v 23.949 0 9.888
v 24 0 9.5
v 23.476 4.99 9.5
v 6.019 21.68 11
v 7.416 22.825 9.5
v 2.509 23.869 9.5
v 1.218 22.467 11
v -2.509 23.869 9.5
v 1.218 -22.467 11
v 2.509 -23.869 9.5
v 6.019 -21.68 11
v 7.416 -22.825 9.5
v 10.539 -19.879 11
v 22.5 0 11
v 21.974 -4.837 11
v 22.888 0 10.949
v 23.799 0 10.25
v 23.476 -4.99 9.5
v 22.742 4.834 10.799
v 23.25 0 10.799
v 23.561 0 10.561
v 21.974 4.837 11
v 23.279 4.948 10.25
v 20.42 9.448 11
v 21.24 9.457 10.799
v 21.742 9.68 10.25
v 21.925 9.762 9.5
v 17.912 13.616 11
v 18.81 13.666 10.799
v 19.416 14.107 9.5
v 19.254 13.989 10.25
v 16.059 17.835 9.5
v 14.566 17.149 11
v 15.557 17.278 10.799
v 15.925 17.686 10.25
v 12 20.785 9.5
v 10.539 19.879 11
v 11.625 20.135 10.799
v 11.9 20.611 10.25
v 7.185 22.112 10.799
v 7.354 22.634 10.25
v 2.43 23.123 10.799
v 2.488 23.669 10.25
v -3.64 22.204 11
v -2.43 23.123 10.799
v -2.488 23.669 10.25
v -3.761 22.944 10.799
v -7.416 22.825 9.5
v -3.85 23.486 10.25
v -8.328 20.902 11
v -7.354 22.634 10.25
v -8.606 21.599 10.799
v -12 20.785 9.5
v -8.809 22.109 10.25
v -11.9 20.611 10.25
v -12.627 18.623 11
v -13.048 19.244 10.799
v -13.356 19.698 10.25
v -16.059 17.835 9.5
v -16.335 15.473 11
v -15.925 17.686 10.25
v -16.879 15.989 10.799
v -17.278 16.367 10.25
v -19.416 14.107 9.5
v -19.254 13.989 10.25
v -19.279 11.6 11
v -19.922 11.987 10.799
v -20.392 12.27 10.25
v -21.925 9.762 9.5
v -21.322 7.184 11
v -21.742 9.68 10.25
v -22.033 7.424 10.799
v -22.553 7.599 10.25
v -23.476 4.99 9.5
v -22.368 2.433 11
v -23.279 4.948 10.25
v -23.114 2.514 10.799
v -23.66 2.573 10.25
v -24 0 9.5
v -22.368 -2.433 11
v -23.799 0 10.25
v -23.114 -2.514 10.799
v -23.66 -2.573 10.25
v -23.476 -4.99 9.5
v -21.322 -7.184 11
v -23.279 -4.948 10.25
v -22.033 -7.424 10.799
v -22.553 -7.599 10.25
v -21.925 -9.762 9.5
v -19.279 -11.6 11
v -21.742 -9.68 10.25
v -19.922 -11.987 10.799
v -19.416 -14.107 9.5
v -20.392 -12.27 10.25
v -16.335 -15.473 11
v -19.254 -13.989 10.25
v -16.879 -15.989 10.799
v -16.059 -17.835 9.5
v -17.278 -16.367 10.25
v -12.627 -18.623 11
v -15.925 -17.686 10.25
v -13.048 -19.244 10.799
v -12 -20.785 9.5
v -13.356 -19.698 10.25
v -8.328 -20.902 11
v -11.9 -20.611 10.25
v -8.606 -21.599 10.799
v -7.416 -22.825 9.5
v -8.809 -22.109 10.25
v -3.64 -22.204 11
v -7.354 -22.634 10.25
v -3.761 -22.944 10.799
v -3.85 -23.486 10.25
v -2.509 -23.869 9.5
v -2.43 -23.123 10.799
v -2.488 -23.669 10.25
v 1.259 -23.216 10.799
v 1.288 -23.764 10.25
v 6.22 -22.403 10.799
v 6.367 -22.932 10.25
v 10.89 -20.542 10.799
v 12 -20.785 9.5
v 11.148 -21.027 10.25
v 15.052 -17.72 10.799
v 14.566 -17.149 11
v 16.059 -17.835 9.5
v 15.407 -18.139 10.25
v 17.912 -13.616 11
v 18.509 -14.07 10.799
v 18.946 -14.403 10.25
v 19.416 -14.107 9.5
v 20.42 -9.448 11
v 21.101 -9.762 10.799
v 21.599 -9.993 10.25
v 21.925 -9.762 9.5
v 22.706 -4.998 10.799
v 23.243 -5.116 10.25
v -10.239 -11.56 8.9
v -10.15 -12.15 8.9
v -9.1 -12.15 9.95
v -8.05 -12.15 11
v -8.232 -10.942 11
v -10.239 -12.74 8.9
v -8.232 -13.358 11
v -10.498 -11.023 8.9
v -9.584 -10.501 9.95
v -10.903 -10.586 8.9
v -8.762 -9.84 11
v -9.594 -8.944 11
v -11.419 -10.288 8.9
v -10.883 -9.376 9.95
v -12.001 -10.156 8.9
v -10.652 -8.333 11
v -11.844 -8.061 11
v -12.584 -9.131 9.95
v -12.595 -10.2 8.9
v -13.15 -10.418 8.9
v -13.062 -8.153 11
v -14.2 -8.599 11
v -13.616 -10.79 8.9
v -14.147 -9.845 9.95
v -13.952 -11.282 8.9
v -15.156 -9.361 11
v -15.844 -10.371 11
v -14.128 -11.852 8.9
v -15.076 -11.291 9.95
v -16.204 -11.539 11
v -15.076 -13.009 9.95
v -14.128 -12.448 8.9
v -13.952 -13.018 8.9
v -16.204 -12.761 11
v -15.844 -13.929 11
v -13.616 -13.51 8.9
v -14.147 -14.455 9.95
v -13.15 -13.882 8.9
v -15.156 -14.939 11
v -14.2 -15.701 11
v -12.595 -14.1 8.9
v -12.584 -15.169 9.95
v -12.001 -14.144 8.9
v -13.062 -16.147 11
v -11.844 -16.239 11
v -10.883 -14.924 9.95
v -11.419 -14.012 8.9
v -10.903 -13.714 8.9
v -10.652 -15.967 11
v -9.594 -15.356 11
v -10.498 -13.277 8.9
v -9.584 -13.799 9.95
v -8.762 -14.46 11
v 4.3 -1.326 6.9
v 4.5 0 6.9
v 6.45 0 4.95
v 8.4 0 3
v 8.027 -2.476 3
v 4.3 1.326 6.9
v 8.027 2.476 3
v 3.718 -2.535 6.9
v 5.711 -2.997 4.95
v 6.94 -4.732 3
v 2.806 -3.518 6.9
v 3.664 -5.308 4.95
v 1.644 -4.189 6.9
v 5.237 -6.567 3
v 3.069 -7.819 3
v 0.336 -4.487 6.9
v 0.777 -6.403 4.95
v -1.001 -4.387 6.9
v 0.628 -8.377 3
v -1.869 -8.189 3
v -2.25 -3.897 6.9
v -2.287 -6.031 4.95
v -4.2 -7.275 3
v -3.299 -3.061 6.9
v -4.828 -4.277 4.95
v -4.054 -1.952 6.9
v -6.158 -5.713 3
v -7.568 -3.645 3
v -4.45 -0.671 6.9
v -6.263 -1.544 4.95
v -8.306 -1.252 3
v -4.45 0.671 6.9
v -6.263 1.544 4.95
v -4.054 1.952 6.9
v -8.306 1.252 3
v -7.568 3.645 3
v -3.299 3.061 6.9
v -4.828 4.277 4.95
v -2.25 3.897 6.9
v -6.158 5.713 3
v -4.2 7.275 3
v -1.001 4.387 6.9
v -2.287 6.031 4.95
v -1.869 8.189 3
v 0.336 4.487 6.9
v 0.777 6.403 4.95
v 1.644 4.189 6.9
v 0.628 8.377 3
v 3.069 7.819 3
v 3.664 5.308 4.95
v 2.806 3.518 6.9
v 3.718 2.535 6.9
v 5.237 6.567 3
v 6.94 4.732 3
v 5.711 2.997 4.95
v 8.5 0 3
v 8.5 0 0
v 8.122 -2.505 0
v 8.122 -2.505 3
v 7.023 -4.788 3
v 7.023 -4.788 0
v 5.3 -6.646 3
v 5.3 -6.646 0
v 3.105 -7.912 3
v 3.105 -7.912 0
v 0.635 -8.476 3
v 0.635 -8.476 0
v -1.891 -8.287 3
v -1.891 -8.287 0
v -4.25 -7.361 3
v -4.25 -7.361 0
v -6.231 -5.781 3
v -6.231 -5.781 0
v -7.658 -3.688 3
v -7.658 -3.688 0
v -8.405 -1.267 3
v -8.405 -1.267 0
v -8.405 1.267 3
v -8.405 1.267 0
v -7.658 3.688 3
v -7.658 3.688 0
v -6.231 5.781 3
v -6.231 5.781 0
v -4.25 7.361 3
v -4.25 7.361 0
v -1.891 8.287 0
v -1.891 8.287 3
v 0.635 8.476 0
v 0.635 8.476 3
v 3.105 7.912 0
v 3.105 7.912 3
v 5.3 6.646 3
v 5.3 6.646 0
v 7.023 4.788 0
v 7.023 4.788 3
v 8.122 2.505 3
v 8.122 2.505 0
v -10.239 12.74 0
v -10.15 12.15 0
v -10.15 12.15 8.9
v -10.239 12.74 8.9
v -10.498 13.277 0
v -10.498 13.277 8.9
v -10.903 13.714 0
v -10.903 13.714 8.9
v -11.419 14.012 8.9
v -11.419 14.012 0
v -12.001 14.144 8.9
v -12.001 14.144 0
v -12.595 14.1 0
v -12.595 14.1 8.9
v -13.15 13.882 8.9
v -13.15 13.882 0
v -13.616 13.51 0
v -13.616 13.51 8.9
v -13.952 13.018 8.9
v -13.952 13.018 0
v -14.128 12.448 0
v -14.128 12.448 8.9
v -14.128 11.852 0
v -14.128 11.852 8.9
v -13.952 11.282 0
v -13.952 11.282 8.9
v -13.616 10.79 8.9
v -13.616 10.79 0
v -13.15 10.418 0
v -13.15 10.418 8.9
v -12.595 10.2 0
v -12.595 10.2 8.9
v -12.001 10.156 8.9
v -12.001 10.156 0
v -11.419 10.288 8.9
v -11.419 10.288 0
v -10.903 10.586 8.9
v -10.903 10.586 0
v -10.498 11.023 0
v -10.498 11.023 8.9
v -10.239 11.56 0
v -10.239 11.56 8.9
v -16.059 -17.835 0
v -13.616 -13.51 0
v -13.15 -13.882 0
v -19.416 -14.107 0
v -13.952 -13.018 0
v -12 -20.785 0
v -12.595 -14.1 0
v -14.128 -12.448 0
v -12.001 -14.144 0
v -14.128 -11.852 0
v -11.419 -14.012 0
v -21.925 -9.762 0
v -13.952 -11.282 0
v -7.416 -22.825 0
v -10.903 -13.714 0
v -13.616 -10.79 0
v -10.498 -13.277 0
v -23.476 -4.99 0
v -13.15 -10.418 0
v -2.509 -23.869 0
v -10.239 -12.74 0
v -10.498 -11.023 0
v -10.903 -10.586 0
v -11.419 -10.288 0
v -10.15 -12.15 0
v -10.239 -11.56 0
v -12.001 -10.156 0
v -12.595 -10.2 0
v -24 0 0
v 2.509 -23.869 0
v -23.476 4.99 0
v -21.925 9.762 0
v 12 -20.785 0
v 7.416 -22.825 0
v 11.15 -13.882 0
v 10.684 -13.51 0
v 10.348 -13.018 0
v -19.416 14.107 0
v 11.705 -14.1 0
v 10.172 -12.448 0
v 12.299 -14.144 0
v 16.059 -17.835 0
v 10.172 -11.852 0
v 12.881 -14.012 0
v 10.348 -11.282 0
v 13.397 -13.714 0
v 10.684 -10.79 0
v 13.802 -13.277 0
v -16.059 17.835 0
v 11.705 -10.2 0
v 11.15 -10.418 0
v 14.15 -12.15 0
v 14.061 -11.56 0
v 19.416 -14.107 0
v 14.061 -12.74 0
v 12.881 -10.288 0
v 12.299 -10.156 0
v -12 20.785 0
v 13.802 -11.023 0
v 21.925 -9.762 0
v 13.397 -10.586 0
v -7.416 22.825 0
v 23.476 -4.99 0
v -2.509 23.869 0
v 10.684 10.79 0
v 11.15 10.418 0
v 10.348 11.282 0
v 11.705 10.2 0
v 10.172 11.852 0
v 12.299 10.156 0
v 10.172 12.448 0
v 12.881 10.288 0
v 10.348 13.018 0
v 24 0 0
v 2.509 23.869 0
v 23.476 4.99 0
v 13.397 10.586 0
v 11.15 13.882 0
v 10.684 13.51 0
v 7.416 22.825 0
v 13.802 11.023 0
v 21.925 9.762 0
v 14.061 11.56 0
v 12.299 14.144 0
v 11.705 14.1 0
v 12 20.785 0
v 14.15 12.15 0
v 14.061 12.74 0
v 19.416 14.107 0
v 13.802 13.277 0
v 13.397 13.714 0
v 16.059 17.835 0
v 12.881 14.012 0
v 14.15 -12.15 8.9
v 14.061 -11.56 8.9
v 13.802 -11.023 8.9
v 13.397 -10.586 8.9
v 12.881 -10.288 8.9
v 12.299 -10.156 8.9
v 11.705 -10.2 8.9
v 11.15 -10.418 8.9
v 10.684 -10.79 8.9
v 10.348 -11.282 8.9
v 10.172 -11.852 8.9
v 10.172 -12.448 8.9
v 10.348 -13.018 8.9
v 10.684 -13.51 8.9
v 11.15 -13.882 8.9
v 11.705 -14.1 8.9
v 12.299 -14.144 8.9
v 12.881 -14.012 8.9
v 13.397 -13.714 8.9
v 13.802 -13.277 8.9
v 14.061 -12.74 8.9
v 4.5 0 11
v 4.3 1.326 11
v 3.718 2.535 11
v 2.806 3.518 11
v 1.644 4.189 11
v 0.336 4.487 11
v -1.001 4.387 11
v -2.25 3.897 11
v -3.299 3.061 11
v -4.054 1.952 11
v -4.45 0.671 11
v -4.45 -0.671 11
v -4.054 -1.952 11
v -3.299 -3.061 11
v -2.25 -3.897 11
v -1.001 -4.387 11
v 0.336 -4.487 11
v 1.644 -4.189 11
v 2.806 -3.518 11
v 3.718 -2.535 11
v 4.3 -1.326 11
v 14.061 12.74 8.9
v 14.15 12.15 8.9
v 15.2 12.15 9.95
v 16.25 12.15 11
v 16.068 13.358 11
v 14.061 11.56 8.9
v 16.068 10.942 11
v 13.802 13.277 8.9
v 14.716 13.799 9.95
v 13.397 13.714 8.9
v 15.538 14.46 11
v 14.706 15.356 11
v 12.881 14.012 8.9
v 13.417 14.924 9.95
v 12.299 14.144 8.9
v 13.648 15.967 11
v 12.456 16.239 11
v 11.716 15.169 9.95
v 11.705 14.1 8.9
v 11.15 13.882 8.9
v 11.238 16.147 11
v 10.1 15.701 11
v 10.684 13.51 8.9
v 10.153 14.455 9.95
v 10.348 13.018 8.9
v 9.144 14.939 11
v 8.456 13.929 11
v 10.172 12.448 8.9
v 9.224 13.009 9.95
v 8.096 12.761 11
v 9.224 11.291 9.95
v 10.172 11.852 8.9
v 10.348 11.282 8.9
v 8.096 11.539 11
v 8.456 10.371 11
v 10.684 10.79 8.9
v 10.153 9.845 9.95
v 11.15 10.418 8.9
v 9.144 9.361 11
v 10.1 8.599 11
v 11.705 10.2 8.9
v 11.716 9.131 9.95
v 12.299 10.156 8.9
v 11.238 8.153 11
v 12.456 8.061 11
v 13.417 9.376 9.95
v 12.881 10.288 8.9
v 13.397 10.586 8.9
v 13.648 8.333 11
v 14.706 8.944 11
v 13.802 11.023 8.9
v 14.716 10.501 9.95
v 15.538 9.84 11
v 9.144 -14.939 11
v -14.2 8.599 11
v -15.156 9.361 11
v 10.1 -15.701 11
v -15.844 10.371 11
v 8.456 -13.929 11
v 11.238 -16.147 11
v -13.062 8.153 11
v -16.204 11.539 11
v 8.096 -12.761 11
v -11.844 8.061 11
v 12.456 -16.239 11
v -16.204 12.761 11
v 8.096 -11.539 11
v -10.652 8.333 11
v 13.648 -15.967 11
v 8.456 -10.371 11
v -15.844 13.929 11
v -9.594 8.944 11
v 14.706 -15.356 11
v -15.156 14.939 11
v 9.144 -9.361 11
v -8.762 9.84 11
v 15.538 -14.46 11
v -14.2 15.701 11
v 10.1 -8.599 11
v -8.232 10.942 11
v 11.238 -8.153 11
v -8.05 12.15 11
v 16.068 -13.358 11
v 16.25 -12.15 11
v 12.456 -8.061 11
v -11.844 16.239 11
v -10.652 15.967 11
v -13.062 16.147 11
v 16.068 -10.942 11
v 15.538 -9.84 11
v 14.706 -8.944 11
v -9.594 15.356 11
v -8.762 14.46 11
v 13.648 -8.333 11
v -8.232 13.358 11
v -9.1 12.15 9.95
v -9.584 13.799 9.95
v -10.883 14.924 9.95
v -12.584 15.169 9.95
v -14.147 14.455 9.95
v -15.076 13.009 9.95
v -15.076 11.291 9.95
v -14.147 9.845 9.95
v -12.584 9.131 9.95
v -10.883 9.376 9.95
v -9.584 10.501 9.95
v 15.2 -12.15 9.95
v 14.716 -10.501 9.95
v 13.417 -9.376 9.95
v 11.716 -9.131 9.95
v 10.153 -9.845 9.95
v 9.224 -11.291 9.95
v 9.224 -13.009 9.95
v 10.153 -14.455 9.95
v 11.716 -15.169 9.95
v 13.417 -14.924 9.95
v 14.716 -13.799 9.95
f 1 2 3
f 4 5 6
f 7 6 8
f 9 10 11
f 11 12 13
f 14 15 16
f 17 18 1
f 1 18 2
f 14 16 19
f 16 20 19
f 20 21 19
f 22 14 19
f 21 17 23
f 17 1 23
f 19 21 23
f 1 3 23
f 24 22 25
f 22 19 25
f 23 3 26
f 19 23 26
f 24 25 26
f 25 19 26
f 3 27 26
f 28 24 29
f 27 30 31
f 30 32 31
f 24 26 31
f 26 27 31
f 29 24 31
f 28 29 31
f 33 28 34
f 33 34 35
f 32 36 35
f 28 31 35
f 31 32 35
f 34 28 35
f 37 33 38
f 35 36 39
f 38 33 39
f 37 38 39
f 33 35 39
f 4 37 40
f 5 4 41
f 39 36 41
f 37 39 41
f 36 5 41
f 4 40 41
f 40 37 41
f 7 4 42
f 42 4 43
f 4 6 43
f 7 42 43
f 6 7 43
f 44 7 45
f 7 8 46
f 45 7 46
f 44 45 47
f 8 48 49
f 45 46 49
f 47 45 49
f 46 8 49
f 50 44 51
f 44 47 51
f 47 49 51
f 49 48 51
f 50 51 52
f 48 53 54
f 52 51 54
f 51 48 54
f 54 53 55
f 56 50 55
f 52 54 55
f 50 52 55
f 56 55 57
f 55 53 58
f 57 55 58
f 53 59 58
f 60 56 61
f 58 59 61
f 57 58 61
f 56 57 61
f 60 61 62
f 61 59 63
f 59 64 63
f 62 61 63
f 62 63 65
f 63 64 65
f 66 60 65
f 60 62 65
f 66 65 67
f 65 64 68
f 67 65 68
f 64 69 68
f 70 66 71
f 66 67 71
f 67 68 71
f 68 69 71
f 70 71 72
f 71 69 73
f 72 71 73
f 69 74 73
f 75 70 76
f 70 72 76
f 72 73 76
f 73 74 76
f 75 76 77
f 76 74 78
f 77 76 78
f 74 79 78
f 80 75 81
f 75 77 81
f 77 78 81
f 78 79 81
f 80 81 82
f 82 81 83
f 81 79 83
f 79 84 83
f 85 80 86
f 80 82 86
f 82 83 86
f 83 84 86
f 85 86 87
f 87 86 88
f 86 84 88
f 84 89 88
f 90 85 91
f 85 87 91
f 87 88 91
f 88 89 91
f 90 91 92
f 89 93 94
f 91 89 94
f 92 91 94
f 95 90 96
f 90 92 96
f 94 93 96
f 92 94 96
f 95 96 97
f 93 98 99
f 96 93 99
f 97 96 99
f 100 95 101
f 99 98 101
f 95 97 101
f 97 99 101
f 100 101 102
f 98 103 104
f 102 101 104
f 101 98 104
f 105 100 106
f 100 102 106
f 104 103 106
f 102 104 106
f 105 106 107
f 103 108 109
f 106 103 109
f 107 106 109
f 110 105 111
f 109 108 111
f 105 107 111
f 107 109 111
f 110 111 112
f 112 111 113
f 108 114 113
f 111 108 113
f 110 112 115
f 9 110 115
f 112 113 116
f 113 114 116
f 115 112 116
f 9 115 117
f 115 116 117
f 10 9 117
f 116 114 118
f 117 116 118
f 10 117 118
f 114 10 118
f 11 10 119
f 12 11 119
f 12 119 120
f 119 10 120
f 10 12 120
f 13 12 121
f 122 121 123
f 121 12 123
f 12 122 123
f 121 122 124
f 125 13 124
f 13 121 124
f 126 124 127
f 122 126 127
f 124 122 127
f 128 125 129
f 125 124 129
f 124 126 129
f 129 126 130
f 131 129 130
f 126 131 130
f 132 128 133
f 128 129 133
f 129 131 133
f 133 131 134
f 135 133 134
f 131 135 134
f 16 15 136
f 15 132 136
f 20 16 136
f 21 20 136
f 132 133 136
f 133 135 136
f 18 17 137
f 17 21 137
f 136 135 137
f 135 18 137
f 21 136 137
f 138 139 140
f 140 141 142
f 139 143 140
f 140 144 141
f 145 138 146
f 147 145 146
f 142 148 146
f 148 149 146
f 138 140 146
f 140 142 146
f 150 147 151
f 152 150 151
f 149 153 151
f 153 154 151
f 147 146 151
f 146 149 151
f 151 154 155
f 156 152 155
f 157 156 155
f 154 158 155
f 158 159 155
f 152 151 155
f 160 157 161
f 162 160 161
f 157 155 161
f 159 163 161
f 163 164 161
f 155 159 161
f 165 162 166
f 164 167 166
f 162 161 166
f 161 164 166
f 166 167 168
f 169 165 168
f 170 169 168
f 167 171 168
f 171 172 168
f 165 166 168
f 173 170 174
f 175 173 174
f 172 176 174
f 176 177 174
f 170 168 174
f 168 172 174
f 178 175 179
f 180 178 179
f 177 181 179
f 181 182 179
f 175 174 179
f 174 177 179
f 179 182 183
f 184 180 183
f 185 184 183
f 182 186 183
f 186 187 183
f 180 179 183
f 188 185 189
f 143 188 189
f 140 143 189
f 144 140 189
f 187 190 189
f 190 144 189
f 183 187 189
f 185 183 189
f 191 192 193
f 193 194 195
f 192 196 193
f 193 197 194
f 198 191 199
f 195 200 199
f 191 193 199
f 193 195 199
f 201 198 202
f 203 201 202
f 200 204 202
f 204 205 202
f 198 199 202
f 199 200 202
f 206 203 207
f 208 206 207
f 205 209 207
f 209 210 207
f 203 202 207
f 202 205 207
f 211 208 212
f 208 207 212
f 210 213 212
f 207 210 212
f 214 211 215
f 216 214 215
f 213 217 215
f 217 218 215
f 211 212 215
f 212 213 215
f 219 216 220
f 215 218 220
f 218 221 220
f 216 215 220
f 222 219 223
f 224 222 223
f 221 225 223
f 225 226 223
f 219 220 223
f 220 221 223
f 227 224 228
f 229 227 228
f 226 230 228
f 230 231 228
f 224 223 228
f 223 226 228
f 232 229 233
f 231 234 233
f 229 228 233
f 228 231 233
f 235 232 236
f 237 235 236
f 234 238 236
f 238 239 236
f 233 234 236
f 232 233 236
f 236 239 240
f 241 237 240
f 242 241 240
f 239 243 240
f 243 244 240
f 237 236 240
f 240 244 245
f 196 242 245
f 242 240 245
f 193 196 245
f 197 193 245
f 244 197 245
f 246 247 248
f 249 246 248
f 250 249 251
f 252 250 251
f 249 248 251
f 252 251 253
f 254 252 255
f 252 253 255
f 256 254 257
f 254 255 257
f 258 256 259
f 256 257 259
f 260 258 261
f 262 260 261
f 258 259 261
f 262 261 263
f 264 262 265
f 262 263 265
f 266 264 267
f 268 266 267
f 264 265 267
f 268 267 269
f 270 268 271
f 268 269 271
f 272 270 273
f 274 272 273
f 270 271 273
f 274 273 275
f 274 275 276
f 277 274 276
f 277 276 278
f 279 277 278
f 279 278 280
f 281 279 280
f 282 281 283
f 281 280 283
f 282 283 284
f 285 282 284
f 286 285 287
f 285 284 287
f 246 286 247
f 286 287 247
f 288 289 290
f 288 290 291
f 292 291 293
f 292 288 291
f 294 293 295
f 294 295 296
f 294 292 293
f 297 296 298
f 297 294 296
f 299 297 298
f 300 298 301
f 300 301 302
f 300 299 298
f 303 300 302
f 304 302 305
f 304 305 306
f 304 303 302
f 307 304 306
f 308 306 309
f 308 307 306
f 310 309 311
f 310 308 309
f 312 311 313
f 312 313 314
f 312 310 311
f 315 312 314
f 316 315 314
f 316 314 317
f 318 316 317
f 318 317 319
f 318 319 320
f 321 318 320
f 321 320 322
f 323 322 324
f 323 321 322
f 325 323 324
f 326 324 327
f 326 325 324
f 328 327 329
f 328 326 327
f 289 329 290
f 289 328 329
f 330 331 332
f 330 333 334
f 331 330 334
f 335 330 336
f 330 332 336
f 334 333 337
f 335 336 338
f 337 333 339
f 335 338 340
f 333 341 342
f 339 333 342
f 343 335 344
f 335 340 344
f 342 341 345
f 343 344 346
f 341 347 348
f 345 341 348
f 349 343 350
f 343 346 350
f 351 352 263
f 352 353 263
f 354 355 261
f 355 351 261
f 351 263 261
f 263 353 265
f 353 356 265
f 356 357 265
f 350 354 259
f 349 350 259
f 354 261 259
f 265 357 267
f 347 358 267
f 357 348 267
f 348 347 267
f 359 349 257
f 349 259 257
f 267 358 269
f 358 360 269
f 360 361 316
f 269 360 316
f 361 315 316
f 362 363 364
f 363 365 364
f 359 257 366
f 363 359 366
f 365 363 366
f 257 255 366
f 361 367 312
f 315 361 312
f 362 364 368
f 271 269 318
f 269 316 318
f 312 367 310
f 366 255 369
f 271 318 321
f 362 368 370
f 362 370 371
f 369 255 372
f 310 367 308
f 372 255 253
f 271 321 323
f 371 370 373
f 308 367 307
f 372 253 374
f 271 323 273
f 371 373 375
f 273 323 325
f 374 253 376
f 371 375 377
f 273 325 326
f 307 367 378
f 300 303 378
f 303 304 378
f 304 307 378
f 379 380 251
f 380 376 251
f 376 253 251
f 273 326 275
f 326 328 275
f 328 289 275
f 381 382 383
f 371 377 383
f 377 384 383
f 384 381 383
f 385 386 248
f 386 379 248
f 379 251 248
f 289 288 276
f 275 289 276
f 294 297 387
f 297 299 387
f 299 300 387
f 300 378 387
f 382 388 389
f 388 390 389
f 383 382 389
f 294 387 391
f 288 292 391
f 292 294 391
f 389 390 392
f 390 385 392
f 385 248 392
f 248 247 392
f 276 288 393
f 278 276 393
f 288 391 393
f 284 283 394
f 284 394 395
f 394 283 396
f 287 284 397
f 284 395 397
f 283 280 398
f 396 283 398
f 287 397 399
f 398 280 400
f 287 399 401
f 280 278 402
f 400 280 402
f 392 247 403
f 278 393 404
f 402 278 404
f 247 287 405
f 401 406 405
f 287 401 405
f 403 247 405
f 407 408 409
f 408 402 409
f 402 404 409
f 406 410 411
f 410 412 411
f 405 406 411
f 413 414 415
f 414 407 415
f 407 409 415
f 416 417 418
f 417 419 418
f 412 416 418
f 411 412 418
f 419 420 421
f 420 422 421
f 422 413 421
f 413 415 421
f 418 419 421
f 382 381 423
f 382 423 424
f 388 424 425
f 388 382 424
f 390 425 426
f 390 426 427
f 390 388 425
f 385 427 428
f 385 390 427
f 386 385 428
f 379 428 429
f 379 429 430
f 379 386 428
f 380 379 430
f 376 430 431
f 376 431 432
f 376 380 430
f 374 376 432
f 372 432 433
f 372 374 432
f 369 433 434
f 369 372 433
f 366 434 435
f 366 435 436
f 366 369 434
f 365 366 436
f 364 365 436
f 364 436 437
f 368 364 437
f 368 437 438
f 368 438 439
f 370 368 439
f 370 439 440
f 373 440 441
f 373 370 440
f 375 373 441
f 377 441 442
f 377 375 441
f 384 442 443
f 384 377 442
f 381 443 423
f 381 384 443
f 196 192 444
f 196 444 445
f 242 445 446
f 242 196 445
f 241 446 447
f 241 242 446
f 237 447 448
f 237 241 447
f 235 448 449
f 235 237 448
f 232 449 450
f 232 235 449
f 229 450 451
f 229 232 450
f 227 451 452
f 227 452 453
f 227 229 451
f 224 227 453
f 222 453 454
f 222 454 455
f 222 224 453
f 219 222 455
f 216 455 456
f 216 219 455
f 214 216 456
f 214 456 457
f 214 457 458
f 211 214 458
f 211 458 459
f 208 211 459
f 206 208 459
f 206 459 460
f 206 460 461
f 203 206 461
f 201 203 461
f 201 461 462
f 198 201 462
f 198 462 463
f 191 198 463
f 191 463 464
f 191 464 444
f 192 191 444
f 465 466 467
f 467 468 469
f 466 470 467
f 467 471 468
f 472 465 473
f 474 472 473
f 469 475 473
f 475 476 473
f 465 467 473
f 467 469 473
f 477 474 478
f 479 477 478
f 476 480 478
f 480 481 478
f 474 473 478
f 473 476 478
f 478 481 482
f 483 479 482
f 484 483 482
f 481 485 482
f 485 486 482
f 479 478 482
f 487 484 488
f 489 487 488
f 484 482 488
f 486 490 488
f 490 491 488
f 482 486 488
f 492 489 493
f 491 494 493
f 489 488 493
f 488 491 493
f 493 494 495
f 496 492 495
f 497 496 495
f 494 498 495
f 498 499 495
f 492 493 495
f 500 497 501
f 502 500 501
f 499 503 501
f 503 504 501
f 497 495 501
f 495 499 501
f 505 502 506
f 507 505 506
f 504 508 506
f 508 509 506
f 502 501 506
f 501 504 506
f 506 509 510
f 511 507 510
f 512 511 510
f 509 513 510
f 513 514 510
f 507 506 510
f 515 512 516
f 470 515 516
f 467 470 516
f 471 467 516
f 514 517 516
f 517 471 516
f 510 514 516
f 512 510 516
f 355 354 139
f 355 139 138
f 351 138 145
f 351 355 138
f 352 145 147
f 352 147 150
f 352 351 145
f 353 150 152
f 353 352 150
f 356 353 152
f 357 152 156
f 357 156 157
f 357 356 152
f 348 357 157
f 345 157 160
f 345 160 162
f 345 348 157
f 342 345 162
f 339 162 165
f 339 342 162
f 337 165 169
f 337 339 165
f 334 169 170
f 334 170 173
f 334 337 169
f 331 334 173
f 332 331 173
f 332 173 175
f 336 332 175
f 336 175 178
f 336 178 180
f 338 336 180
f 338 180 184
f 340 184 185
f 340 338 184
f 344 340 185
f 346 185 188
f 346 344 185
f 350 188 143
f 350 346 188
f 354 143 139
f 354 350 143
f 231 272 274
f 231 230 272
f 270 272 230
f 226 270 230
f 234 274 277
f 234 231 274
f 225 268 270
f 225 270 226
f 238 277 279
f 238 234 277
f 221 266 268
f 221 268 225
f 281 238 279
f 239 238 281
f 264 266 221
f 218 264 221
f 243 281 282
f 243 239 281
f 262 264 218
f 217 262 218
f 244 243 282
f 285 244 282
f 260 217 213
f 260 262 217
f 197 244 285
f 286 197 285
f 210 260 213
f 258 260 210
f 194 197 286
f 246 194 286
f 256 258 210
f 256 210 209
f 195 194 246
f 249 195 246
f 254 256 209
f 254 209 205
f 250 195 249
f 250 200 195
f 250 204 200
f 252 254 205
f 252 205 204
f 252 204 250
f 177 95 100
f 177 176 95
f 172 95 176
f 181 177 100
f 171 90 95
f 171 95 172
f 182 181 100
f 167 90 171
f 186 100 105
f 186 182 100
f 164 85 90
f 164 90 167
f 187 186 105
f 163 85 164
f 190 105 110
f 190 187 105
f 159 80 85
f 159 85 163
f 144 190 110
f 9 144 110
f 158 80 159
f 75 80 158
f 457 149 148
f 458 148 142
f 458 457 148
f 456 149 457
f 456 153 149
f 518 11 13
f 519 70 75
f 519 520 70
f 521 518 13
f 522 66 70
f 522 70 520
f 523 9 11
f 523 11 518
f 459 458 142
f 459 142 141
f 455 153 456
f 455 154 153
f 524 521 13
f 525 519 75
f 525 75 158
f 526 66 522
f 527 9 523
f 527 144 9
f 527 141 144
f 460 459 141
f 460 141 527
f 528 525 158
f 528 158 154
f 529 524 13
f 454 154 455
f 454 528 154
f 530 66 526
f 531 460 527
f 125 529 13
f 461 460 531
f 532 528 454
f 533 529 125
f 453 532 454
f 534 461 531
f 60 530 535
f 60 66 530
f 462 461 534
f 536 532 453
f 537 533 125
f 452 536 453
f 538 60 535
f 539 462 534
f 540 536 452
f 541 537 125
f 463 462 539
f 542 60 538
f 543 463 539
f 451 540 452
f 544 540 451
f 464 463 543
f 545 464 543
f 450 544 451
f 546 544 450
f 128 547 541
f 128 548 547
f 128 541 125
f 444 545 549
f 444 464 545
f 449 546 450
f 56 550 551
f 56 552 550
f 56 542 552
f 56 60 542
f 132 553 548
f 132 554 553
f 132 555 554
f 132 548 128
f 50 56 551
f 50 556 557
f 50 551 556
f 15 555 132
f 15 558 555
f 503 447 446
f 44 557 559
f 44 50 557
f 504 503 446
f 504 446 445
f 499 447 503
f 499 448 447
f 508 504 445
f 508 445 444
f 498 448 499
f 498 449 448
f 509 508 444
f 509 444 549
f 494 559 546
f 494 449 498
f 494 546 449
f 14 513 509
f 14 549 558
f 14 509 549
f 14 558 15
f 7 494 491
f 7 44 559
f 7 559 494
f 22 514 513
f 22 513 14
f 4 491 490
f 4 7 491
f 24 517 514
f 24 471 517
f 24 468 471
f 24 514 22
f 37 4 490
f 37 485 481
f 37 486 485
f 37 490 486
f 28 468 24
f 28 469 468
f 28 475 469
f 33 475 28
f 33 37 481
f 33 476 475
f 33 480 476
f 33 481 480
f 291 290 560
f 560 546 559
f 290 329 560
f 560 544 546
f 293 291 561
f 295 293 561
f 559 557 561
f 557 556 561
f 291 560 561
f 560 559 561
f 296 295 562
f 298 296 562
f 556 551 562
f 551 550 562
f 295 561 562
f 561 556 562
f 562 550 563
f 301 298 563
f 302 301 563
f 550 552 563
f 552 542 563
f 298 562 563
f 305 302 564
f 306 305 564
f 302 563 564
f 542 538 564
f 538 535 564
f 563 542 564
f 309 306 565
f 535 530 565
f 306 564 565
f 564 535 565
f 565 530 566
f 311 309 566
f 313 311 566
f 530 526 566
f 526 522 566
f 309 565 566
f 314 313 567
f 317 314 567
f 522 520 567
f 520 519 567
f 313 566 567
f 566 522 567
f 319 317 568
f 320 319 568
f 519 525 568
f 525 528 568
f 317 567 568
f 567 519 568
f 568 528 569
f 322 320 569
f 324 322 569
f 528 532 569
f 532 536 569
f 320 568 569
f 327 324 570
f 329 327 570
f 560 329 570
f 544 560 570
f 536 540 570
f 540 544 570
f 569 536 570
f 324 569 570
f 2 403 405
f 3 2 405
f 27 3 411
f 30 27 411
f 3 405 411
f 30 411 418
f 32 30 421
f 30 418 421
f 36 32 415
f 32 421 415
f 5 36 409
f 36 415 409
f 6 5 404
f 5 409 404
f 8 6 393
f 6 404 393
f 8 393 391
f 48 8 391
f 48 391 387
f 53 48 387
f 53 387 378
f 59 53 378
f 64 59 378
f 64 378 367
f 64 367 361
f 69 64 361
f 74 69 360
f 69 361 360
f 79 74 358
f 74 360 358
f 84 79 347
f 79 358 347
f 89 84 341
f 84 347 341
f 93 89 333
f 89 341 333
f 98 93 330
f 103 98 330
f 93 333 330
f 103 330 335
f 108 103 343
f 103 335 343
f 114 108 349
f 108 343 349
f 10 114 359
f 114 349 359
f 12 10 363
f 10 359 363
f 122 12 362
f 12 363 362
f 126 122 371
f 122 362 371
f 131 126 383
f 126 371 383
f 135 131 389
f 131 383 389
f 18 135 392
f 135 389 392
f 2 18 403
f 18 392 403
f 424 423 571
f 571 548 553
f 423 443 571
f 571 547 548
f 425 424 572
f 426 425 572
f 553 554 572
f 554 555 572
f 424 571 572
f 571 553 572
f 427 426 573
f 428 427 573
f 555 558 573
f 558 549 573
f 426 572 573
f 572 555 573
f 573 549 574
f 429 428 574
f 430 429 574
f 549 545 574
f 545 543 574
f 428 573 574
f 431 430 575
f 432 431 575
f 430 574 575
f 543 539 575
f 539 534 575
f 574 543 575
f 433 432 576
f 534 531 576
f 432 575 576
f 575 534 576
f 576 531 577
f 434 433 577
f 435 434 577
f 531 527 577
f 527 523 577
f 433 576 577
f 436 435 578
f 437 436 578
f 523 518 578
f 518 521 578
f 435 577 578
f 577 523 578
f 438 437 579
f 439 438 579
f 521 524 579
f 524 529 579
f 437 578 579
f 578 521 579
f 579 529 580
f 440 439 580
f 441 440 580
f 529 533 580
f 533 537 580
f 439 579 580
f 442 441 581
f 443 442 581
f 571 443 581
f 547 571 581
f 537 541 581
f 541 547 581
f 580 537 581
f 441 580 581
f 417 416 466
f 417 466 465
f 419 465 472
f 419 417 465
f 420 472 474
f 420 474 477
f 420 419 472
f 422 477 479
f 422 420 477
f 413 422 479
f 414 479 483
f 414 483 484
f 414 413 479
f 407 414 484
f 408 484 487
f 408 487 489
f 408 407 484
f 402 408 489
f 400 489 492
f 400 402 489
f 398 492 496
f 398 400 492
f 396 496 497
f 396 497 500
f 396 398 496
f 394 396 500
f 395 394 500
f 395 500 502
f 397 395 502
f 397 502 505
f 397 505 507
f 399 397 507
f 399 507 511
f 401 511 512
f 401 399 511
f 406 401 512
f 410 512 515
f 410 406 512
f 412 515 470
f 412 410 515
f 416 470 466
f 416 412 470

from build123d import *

# Parameters (mm, degrees)
SKETCH_R        = 24
SKETCH_R_2      = 4.5
SKETCH_R_3      = 2
PAD_DEPTH       = 11
CHAMFER_SIZE    = 2.1
FILLET_R        = 1.5
SKETCH001_R     = 8.5
POCKET_DEPTH    = 3
CHAMFER001_SIZE = 3.9


with BuildPart() as part:
    # Sketch → Pad (new body)
    with BuildSketch(Plane.XY):
        Circle(SKETCH_R)
        Circle(SKETCH_R_2, mode=Mode.SUBTRACT)
        with Locations((-12.15, 12.15)):
            Circle(SKETCH_R_3, mode=Mode.SUBTRACT)
        with Locations((12.15, 12.15)):
            Circle(SKETCH_R_3, mode=Mode.SUBTRACT)
        with Locations((12.15, -12.15)):
            Circle(SKETCH_R_3, mode=Mode.SUBTRACT)
        with Locations((-12.15, -12.15)):
            Circle(SKETCH_R_3, mode=Mode.SUBTRACT)
    extrude(amount=PAD_DEPTH)

    # Chamfer
    chamfer_edges = [part.edges().sort_by_distance(p)[0] for p in [
        (-14.15, 12.15, 11),
        (-14.15, -12.15, 11),
        (10.15, 12.15, 11),
        (10.15, -12.15, 11),
    ]]
    chamfer(chamfer_edges, length=CHAMFER_SIZE)

    # Fillet
    fillet_edges = [part.edges().sort_by_distance(p)[0] for p in [
        (-24, 0, 11),
    ]]
    fillet(fillet_edges, radius=FILLET_R)

    # Sketch001 (on Face10 of Fillet) → Pocket (cut)
    with BuildSketch(Plane(origin=(0, 0, 0), x_dir=(1, 0, 0), z_dir=(0, 0, -1))):
        Circle(SKETCH001_R)
    extrude(amount=-POCKET_DEPTH, mode=Mode.SUBTRACT)

    # Chamfer001
    chamfer001_edges = [part.edges().sort_by_distance(p)[0] for p in [
        (-4.5, 0, 3),
    ]]
    chamfer(chamfer001_edges, length=CHAMFER001_SIZE)


solid = part.part
